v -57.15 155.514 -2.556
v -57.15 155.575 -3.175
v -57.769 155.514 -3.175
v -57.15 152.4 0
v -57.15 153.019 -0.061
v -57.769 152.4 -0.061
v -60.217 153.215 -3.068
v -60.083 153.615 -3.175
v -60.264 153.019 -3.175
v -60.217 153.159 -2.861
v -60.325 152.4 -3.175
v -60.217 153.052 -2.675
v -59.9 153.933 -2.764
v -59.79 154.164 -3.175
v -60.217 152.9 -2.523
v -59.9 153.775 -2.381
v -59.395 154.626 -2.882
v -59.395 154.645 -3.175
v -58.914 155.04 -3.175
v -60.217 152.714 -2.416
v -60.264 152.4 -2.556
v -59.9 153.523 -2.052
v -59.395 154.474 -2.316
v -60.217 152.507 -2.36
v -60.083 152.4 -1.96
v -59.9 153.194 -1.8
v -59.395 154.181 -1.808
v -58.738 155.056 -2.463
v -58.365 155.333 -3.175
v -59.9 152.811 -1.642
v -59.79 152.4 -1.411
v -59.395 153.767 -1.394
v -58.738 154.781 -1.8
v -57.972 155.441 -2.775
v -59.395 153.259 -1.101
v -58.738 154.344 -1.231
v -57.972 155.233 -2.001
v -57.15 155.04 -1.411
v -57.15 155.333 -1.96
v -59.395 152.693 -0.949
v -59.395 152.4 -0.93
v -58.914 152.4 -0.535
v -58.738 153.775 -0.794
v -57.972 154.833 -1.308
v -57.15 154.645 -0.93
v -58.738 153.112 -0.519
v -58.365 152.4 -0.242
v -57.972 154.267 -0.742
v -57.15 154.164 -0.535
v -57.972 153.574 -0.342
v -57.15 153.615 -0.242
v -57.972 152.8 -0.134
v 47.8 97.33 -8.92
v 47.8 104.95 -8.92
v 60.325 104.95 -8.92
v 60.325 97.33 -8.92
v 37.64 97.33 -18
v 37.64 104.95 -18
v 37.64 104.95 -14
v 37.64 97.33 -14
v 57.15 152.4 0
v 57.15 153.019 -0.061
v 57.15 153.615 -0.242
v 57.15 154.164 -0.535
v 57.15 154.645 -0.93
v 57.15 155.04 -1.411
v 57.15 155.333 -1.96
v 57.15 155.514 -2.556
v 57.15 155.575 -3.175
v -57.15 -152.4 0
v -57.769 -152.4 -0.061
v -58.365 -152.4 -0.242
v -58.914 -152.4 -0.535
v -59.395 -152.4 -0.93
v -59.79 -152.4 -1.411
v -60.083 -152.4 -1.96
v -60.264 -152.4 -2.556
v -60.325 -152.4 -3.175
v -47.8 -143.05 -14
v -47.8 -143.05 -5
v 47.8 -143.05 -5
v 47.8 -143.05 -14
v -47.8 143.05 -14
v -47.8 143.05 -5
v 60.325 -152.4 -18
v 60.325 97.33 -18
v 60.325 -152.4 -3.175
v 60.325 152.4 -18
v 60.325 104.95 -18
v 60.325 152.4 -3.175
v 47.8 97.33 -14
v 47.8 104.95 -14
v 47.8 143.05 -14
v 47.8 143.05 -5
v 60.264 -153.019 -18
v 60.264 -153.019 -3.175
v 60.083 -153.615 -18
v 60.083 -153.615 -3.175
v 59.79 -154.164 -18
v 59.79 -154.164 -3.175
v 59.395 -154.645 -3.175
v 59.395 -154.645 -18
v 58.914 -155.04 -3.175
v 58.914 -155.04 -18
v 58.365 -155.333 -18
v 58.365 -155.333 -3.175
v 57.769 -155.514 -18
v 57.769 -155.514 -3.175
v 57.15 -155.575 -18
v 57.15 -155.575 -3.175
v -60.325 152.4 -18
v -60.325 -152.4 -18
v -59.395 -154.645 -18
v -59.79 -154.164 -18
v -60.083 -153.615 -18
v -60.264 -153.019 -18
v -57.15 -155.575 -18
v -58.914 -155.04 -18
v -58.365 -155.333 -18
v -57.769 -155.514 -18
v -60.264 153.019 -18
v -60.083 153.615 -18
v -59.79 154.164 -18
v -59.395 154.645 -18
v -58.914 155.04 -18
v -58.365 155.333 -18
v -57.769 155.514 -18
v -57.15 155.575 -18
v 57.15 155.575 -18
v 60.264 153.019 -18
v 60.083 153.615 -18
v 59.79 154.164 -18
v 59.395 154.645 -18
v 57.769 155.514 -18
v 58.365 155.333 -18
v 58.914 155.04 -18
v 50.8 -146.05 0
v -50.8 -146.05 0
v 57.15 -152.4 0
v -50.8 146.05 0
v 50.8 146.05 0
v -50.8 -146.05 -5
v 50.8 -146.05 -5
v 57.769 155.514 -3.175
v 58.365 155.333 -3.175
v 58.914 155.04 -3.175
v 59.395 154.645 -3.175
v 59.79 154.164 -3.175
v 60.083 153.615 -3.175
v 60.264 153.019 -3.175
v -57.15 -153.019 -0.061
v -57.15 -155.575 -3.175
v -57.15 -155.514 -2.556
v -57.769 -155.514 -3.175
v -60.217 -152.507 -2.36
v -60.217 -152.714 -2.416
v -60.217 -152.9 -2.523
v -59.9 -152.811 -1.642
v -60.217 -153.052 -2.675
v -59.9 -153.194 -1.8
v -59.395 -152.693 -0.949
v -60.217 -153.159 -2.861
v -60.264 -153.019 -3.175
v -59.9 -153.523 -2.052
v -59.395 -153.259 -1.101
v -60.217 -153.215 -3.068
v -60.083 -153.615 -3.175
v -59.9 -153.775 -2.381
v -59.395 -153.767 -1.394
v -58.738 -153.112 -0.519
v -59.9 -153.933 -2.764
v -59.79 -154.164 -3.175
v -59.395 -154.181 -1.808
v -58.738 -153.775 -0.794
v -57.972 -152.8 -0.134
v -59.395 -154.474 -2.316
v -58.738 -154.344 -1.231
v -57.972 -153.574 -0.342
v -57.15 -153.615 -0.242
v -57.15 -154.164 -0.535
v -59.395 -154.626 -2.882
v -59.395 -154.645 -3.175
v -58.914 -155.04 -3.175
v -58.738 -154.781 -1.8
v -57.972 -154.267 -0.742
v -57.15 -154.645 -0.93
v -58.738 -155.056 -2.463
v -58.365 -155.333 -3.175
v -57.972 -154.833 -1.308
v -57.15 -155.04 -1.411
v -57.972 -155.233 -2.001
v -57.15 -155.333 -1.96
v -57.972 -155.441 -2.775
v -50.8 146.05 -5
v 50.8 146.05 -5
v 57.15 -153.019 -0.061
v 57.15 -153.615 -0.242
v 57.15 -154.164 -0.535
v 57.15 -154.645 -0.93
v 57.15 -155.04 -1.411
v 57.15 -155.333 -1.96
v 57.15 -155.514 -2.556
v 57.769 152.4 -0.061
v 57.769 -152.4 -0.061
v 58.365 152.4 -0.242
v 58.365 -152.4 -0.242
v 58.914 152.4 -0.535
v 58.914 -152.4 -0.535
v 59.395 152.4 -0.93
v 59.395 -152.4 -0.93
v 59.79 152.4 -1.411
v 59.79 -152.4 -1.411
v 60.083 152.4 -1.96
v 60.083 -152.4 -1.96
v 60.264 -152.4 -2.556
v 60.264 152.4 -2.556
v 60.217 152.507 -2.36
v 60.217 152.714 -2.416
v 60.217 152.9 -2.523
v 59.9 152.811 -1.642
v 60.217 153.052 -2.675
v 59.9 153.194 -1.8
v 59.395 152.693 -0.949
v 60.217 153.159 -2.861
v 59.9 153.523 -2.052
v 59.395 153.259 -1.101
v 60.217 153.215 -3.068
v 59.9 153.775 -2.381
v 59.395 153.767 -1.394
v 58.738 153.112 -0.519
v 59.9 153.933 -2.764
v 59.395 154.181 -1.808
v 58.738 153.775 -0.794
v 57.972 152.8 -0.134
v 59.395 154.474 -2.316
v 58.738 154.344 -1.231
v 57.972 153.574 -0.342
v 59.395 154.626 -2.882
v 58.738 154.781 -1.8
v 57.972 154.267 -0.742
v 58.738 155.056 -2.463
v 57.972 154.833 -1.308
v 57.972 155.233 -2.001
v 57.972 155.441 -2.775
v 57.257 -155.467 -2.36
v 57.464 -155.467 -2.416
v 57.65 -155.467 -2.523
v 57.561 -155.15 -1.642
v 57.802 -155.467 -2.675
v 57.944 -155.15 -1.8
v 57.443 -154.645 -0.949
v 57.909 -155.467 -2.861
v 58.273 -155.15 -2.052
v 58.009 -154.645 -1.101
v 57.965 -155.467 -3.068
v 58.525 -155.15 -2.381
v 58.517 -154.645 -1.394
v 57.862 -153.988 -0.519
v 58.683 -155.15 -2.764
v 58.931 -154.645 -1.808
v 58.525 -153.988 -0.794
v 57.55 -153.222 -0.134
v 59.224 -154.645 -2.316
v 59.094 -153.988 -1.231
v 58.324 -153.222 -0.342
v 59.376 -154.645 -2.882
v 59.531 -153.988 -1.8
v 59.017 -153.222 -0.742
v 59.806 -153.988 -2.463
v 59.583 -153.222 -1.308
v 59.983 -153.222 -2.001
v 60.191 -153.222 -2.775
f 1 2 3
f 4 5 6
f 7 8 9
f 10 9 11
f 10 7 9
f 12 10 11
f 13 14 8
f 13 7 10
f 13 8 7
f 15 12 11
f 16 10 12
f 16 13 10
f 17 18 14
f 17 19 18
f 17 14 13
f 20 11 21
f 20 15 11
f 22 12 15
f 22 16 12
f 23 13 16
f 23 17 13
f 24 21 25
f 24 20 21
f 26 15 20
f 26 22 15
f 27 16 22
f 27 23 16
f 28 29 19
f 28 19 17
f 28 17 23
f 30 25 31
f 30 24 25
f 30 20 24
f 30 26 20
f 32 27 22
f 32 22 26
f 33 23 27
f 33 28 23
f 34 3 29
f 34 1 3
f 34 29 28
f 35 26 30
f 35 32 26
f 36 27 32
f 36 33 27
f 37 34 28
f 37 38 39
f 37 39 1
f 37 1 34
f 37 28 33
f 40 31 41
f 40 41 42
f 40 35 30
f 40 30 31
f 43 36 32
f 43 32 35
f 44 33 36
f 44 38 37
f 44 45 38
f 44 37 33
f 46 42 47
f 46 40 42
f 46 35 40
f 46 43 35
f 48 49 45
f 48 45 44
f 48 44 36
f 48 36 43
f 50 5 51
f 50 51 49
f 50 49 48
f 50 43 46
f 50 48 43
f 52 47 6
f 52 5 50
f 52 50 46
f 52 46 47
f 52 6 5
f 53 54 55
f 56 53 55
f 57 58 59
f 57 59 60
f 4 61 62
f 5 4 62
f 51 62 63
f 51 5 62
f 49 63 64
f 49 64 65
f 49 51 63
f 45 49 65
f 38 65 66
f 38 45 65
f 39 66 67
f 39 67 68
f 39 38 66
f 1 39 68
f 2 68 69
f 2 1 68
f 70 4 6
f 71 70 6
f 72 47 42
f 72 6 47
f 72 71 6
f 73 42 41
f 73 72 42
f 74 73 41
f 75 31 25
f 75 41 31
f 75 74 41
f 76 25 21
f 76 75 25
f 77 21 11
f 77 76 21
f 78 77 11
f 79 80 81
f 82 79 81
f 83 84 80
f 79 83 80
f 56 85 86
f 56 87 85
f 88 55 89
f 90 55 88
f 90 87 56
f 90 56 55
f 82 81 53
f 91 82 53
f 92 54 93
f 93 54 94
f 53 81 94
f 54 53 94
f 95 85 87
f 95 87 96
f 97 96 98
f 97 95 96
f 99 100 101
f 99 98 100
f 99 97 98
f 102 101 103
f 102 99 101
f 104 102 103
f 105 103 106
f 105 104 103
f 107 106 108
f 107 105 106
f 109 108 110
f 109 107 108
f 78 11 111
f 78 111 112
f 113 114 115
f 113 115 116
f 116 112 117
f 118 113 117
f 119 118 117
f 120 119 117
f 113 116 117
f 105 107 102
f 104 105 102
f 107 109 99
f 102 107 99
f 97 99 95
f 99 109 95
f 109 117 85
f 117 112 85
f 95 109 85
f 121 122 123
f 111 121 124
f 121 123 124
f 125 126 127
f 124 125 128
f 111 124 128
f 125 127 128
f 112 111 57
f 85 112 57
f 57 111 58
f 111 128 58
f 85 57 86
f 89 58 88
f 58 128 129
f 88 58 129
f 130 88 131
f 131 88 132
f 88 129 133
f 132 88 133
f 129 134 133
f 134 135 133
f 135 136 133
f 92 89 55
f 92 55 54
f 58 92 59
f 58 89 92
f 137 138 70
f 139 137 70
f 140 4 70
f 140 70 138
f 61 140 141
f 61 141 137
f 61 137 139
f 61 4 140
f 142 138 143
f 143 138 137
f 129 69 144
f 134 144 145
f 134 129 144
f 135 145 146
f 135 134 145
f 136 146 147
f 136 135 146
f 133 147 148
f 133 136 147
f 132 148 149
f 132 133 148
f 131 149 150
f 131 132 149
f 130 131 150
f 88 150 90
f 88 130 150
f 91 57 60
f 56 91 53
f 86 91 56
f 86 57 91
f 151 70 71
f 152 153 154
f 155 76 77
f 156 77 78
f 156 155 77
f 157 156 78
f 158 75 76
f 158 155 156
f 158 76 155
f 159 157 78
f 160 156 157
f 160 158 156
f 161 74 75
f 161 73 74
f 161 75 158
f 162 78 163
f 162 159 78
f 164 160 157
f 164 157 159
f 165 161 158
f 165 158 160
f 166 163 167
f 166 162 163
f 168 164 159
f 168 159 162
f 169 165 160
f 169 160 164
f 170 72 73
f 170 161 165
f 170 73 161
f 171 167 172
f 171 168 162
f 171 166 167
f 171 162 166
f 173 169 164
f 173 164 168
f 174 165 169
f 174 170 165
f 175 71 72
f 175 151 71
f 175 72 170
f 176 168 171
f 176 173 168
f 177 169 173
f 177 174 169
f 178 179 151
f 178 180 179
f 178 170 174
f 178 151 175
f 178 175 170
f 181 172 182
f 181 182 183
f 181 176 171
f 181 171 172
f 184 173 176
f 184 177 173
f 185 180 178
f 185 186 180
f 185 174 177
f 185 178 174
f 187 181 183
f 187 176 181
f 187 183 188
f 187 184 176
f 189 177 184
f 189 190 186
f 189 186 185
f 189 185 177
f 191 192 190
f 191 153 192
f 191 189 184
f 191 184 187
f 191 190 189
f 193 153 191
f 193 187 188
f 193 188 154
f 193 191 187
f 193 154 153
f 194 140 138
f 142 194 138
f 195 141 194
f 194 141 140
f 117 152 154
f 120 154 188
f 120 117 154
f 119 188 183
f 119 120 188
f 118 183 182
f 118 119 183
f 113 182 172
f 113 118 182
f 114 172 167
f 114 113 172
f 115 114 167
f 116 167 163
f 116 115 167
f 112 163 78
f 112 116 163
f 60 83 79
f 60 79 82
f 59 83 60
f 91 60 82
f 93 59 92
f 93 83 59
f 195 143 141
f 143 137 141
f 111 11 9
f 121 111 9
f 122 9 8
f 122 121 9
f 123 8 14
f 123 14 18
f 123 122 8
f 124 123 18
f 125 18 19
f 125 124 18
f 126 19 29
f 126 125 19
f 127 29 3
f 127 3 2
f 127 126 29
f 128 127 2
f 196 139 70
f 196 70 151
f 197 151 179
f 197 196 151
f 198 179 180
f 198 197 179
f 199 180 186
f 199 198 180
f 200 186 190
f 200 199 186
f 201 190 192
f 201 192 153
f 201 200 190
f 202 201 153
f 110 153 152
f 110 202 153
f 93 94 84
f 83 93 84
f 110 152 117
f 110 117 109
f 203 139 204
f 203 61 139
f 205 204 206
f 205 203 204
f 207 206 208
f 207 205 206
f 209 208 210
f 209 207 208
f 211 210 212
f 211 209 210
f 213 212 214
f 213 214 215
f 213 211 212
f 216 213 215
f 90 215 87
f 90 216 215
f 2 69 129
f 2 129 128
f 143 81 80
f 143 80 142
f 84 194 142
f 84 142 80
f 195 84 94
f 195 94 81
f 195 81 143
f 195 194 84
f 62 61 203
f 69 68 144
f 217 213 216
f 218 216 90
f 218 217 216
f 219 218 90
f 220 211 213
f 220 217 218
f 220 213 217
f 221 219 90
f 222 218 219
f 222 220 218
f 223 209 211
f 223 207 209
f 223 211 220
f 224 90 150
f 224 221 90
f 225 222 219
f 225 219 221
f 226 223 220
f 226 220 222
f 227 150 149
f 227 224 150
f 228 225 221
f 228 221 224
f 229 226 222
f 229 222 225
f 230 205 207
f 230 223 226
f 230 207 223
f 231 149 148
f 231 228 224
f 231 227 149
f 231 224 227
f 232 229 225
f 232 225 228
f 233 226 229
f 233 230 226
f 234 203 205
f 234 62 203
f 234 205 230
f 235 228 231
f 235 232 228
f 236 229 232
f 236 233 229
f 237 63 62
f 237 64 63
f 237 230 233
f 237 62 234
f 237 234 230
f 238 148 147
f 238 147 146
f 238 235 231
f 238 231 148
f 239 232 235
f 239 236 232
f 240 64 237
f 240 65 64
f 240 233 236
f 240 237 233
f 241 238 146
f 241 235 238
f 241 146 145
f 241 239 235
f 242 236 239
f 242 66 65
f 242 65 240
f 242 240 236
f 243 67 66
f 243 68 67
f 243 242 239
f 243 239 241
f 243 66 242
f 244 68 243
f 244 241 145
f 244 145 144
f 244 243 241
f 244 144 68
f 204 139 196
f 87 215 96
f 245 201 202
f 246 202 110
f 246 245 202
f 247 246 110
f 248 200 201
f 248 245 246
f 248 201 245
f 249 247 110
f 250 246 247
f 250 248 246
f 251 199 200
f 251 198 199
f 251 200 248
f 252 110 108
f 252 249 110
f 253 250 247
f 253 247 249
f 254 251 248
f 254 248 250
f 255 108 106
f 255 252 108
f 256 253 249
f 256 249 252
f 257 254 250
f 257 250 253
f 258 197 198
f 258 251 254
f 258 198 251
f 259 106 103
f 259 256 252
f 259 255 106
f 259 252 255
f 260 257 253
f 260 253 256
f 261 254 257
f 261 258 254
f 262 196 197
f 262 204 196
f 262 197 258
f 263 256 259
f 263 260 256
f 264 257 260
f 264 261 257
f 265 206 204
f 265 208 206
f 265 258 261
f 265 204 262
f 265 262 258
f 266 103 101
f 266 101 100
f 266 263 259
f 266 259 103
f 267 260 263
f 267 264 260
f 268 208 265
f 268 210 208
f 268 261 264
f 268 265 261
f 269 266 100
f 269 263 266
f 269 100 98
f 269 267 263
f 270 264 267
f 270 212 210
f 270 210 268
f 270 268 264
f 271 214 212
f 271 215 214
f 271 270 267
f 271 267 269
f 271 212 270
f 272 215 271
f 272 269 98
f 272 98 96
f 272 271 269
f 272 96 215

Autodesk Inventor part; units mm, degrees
ref_plane "YZ Plane" through (0, 0, 0) normal (1, 0, 0) x (0, 1, 0)
ref_plane "XZ Plane" through (0, 0, 0) normal (0, 1, 0) x (-1, 0, 0)
ref_plane "XY Plane" through (0, 0, 0) normal (0, 0, 1) x (1, 0, 0)
ref_plane "Work Plane1" through (0, 0, 0) normal (0, 0, 1) x (1, 0, 0)
sketch "Sketch3" plane through (0, 0, 0) normal (0, 0, 1) x (1, 0, 0)
  line L0 (-60.325, -155.575) -> (60.325, -155.575)
  line L1 (60.325, -155.575) -> (60.325, 155.575)
  line L2 (60.325, 155.575) -> (-60.325, 155.575)
  line L3 (-60.325, 155.575) -> (-60.325, -155.575)
  line L4 (-60.325, -155.575) -> (60.325, 155.575) construction
  line L5 (60.325, -155.575) -> (-60.325, 155.575) construction
  point P0 (0, 0)
  dimension "d4" = 120.65
  dimension "d5" = 311.15
extrude "Extrusion2" add sketch "Sketch3" against normal blind 18
sketch "Sketch4" plane through (0, 0, 0) normal (0, 0, 1) x (1, 0, 0)
  line L0 (-50.8, -146.05) -> (50.8, -146.05)
  line L1 (50.8, -146.05) -> (50.8, 146.05)
  line L2 (50.8, 146.05) -> (-50.8, 146.05)
  line L3 (-50.8, 146.05) -> (-50.8, -146.05)
  line L4 (-50.8, -146.05) -> (50.8, 146.05) construction
  line L5 (50.8, -146.05) -> (-50.8, 146.05) construction
  point P0 (0, 0)
  dimension "d8" = 101.6
  dimension "d9" = 292.1
extrude "Extrusion3" cut sketch "Sketch4" against normal blind 5
sketch "Sketch5" plane through (0, 0, -5) normal (0, 0, 1) x (1, 0, 0)
  line L0 (50.8, 146.05) -> (50.8, -146.05) projected
  line L1 (-50.8, 146.05) -> (50.8, 146.05) projected
  line L2 (-50.8, -146.05) -> (-50.8, 146.05) projected
  line L3 (50.8, -146.05) -> (-50.8, -146.05) projected
  line L4 (47.8, -143.05) -> (47.8, 143.05)
  line L5 (47.8, 143.05) -> (-47.8, 143.05)
  line L6 (-47.8, 143.05) -> (-47.8, -143.05)
  line L7 (-47.8, -143.05) -> (47.8, -143.05)
  point P0 (0, 0)
  dimension "d12" = 3
extrude "Extrusion4" cut sketch "Sketch5" against normal blind 9 contours L7 L6 L5 L4
sketch "Sketch6" plane through (0, 0, -14) normal (0, 0, 1) x (1, 0, 0)
  line L0 (47.8, 143.05) -> (47.8, -143.05) projected
  line L1 (47.8, 143.05) -> (47.8, -143.05) projected
  line L2 (47.8, 104.95) -> (37.64, 104.95)
  line L3 (37.64, 104.95) -> (37.64, 97.33)
  line L4 (37.64, 97.33) -> (47.8, 97.33)
  line L5 (47.8, 97.33) -> (47.8, 104.95)
  line L6 (-47.8, 143.05) -> (47.8, 143.05) projected
  line L7 (47.8, 97.33) -> (60.325, 97.33)
  line L8 (60.325, 155.575) -> (60.325, -155.575) projected
  line L9 (60.325, 104.95) -> (47.8, 104.95)
  point P0 (0, 0)
  dimension "d16" = 10.16
  dimension "d17" = 7.62
  dimension "d18" = 38.1
extrude "Extrusion5" cut sketch "Sketch6" along normal mid plane 10.16
fillet "Fillet1" radius 3.175 8 edges at (0, 155.575, 0) (60.325, 0, 0) (0, -155.575, 0) (-60.325, 0, 0) (-60.325, 155.575, -9) (-60.325, -155.575, -9) (60.325, -155.575, -9) (60.325, 155.575, -9)
properties part number "Case Parts"
